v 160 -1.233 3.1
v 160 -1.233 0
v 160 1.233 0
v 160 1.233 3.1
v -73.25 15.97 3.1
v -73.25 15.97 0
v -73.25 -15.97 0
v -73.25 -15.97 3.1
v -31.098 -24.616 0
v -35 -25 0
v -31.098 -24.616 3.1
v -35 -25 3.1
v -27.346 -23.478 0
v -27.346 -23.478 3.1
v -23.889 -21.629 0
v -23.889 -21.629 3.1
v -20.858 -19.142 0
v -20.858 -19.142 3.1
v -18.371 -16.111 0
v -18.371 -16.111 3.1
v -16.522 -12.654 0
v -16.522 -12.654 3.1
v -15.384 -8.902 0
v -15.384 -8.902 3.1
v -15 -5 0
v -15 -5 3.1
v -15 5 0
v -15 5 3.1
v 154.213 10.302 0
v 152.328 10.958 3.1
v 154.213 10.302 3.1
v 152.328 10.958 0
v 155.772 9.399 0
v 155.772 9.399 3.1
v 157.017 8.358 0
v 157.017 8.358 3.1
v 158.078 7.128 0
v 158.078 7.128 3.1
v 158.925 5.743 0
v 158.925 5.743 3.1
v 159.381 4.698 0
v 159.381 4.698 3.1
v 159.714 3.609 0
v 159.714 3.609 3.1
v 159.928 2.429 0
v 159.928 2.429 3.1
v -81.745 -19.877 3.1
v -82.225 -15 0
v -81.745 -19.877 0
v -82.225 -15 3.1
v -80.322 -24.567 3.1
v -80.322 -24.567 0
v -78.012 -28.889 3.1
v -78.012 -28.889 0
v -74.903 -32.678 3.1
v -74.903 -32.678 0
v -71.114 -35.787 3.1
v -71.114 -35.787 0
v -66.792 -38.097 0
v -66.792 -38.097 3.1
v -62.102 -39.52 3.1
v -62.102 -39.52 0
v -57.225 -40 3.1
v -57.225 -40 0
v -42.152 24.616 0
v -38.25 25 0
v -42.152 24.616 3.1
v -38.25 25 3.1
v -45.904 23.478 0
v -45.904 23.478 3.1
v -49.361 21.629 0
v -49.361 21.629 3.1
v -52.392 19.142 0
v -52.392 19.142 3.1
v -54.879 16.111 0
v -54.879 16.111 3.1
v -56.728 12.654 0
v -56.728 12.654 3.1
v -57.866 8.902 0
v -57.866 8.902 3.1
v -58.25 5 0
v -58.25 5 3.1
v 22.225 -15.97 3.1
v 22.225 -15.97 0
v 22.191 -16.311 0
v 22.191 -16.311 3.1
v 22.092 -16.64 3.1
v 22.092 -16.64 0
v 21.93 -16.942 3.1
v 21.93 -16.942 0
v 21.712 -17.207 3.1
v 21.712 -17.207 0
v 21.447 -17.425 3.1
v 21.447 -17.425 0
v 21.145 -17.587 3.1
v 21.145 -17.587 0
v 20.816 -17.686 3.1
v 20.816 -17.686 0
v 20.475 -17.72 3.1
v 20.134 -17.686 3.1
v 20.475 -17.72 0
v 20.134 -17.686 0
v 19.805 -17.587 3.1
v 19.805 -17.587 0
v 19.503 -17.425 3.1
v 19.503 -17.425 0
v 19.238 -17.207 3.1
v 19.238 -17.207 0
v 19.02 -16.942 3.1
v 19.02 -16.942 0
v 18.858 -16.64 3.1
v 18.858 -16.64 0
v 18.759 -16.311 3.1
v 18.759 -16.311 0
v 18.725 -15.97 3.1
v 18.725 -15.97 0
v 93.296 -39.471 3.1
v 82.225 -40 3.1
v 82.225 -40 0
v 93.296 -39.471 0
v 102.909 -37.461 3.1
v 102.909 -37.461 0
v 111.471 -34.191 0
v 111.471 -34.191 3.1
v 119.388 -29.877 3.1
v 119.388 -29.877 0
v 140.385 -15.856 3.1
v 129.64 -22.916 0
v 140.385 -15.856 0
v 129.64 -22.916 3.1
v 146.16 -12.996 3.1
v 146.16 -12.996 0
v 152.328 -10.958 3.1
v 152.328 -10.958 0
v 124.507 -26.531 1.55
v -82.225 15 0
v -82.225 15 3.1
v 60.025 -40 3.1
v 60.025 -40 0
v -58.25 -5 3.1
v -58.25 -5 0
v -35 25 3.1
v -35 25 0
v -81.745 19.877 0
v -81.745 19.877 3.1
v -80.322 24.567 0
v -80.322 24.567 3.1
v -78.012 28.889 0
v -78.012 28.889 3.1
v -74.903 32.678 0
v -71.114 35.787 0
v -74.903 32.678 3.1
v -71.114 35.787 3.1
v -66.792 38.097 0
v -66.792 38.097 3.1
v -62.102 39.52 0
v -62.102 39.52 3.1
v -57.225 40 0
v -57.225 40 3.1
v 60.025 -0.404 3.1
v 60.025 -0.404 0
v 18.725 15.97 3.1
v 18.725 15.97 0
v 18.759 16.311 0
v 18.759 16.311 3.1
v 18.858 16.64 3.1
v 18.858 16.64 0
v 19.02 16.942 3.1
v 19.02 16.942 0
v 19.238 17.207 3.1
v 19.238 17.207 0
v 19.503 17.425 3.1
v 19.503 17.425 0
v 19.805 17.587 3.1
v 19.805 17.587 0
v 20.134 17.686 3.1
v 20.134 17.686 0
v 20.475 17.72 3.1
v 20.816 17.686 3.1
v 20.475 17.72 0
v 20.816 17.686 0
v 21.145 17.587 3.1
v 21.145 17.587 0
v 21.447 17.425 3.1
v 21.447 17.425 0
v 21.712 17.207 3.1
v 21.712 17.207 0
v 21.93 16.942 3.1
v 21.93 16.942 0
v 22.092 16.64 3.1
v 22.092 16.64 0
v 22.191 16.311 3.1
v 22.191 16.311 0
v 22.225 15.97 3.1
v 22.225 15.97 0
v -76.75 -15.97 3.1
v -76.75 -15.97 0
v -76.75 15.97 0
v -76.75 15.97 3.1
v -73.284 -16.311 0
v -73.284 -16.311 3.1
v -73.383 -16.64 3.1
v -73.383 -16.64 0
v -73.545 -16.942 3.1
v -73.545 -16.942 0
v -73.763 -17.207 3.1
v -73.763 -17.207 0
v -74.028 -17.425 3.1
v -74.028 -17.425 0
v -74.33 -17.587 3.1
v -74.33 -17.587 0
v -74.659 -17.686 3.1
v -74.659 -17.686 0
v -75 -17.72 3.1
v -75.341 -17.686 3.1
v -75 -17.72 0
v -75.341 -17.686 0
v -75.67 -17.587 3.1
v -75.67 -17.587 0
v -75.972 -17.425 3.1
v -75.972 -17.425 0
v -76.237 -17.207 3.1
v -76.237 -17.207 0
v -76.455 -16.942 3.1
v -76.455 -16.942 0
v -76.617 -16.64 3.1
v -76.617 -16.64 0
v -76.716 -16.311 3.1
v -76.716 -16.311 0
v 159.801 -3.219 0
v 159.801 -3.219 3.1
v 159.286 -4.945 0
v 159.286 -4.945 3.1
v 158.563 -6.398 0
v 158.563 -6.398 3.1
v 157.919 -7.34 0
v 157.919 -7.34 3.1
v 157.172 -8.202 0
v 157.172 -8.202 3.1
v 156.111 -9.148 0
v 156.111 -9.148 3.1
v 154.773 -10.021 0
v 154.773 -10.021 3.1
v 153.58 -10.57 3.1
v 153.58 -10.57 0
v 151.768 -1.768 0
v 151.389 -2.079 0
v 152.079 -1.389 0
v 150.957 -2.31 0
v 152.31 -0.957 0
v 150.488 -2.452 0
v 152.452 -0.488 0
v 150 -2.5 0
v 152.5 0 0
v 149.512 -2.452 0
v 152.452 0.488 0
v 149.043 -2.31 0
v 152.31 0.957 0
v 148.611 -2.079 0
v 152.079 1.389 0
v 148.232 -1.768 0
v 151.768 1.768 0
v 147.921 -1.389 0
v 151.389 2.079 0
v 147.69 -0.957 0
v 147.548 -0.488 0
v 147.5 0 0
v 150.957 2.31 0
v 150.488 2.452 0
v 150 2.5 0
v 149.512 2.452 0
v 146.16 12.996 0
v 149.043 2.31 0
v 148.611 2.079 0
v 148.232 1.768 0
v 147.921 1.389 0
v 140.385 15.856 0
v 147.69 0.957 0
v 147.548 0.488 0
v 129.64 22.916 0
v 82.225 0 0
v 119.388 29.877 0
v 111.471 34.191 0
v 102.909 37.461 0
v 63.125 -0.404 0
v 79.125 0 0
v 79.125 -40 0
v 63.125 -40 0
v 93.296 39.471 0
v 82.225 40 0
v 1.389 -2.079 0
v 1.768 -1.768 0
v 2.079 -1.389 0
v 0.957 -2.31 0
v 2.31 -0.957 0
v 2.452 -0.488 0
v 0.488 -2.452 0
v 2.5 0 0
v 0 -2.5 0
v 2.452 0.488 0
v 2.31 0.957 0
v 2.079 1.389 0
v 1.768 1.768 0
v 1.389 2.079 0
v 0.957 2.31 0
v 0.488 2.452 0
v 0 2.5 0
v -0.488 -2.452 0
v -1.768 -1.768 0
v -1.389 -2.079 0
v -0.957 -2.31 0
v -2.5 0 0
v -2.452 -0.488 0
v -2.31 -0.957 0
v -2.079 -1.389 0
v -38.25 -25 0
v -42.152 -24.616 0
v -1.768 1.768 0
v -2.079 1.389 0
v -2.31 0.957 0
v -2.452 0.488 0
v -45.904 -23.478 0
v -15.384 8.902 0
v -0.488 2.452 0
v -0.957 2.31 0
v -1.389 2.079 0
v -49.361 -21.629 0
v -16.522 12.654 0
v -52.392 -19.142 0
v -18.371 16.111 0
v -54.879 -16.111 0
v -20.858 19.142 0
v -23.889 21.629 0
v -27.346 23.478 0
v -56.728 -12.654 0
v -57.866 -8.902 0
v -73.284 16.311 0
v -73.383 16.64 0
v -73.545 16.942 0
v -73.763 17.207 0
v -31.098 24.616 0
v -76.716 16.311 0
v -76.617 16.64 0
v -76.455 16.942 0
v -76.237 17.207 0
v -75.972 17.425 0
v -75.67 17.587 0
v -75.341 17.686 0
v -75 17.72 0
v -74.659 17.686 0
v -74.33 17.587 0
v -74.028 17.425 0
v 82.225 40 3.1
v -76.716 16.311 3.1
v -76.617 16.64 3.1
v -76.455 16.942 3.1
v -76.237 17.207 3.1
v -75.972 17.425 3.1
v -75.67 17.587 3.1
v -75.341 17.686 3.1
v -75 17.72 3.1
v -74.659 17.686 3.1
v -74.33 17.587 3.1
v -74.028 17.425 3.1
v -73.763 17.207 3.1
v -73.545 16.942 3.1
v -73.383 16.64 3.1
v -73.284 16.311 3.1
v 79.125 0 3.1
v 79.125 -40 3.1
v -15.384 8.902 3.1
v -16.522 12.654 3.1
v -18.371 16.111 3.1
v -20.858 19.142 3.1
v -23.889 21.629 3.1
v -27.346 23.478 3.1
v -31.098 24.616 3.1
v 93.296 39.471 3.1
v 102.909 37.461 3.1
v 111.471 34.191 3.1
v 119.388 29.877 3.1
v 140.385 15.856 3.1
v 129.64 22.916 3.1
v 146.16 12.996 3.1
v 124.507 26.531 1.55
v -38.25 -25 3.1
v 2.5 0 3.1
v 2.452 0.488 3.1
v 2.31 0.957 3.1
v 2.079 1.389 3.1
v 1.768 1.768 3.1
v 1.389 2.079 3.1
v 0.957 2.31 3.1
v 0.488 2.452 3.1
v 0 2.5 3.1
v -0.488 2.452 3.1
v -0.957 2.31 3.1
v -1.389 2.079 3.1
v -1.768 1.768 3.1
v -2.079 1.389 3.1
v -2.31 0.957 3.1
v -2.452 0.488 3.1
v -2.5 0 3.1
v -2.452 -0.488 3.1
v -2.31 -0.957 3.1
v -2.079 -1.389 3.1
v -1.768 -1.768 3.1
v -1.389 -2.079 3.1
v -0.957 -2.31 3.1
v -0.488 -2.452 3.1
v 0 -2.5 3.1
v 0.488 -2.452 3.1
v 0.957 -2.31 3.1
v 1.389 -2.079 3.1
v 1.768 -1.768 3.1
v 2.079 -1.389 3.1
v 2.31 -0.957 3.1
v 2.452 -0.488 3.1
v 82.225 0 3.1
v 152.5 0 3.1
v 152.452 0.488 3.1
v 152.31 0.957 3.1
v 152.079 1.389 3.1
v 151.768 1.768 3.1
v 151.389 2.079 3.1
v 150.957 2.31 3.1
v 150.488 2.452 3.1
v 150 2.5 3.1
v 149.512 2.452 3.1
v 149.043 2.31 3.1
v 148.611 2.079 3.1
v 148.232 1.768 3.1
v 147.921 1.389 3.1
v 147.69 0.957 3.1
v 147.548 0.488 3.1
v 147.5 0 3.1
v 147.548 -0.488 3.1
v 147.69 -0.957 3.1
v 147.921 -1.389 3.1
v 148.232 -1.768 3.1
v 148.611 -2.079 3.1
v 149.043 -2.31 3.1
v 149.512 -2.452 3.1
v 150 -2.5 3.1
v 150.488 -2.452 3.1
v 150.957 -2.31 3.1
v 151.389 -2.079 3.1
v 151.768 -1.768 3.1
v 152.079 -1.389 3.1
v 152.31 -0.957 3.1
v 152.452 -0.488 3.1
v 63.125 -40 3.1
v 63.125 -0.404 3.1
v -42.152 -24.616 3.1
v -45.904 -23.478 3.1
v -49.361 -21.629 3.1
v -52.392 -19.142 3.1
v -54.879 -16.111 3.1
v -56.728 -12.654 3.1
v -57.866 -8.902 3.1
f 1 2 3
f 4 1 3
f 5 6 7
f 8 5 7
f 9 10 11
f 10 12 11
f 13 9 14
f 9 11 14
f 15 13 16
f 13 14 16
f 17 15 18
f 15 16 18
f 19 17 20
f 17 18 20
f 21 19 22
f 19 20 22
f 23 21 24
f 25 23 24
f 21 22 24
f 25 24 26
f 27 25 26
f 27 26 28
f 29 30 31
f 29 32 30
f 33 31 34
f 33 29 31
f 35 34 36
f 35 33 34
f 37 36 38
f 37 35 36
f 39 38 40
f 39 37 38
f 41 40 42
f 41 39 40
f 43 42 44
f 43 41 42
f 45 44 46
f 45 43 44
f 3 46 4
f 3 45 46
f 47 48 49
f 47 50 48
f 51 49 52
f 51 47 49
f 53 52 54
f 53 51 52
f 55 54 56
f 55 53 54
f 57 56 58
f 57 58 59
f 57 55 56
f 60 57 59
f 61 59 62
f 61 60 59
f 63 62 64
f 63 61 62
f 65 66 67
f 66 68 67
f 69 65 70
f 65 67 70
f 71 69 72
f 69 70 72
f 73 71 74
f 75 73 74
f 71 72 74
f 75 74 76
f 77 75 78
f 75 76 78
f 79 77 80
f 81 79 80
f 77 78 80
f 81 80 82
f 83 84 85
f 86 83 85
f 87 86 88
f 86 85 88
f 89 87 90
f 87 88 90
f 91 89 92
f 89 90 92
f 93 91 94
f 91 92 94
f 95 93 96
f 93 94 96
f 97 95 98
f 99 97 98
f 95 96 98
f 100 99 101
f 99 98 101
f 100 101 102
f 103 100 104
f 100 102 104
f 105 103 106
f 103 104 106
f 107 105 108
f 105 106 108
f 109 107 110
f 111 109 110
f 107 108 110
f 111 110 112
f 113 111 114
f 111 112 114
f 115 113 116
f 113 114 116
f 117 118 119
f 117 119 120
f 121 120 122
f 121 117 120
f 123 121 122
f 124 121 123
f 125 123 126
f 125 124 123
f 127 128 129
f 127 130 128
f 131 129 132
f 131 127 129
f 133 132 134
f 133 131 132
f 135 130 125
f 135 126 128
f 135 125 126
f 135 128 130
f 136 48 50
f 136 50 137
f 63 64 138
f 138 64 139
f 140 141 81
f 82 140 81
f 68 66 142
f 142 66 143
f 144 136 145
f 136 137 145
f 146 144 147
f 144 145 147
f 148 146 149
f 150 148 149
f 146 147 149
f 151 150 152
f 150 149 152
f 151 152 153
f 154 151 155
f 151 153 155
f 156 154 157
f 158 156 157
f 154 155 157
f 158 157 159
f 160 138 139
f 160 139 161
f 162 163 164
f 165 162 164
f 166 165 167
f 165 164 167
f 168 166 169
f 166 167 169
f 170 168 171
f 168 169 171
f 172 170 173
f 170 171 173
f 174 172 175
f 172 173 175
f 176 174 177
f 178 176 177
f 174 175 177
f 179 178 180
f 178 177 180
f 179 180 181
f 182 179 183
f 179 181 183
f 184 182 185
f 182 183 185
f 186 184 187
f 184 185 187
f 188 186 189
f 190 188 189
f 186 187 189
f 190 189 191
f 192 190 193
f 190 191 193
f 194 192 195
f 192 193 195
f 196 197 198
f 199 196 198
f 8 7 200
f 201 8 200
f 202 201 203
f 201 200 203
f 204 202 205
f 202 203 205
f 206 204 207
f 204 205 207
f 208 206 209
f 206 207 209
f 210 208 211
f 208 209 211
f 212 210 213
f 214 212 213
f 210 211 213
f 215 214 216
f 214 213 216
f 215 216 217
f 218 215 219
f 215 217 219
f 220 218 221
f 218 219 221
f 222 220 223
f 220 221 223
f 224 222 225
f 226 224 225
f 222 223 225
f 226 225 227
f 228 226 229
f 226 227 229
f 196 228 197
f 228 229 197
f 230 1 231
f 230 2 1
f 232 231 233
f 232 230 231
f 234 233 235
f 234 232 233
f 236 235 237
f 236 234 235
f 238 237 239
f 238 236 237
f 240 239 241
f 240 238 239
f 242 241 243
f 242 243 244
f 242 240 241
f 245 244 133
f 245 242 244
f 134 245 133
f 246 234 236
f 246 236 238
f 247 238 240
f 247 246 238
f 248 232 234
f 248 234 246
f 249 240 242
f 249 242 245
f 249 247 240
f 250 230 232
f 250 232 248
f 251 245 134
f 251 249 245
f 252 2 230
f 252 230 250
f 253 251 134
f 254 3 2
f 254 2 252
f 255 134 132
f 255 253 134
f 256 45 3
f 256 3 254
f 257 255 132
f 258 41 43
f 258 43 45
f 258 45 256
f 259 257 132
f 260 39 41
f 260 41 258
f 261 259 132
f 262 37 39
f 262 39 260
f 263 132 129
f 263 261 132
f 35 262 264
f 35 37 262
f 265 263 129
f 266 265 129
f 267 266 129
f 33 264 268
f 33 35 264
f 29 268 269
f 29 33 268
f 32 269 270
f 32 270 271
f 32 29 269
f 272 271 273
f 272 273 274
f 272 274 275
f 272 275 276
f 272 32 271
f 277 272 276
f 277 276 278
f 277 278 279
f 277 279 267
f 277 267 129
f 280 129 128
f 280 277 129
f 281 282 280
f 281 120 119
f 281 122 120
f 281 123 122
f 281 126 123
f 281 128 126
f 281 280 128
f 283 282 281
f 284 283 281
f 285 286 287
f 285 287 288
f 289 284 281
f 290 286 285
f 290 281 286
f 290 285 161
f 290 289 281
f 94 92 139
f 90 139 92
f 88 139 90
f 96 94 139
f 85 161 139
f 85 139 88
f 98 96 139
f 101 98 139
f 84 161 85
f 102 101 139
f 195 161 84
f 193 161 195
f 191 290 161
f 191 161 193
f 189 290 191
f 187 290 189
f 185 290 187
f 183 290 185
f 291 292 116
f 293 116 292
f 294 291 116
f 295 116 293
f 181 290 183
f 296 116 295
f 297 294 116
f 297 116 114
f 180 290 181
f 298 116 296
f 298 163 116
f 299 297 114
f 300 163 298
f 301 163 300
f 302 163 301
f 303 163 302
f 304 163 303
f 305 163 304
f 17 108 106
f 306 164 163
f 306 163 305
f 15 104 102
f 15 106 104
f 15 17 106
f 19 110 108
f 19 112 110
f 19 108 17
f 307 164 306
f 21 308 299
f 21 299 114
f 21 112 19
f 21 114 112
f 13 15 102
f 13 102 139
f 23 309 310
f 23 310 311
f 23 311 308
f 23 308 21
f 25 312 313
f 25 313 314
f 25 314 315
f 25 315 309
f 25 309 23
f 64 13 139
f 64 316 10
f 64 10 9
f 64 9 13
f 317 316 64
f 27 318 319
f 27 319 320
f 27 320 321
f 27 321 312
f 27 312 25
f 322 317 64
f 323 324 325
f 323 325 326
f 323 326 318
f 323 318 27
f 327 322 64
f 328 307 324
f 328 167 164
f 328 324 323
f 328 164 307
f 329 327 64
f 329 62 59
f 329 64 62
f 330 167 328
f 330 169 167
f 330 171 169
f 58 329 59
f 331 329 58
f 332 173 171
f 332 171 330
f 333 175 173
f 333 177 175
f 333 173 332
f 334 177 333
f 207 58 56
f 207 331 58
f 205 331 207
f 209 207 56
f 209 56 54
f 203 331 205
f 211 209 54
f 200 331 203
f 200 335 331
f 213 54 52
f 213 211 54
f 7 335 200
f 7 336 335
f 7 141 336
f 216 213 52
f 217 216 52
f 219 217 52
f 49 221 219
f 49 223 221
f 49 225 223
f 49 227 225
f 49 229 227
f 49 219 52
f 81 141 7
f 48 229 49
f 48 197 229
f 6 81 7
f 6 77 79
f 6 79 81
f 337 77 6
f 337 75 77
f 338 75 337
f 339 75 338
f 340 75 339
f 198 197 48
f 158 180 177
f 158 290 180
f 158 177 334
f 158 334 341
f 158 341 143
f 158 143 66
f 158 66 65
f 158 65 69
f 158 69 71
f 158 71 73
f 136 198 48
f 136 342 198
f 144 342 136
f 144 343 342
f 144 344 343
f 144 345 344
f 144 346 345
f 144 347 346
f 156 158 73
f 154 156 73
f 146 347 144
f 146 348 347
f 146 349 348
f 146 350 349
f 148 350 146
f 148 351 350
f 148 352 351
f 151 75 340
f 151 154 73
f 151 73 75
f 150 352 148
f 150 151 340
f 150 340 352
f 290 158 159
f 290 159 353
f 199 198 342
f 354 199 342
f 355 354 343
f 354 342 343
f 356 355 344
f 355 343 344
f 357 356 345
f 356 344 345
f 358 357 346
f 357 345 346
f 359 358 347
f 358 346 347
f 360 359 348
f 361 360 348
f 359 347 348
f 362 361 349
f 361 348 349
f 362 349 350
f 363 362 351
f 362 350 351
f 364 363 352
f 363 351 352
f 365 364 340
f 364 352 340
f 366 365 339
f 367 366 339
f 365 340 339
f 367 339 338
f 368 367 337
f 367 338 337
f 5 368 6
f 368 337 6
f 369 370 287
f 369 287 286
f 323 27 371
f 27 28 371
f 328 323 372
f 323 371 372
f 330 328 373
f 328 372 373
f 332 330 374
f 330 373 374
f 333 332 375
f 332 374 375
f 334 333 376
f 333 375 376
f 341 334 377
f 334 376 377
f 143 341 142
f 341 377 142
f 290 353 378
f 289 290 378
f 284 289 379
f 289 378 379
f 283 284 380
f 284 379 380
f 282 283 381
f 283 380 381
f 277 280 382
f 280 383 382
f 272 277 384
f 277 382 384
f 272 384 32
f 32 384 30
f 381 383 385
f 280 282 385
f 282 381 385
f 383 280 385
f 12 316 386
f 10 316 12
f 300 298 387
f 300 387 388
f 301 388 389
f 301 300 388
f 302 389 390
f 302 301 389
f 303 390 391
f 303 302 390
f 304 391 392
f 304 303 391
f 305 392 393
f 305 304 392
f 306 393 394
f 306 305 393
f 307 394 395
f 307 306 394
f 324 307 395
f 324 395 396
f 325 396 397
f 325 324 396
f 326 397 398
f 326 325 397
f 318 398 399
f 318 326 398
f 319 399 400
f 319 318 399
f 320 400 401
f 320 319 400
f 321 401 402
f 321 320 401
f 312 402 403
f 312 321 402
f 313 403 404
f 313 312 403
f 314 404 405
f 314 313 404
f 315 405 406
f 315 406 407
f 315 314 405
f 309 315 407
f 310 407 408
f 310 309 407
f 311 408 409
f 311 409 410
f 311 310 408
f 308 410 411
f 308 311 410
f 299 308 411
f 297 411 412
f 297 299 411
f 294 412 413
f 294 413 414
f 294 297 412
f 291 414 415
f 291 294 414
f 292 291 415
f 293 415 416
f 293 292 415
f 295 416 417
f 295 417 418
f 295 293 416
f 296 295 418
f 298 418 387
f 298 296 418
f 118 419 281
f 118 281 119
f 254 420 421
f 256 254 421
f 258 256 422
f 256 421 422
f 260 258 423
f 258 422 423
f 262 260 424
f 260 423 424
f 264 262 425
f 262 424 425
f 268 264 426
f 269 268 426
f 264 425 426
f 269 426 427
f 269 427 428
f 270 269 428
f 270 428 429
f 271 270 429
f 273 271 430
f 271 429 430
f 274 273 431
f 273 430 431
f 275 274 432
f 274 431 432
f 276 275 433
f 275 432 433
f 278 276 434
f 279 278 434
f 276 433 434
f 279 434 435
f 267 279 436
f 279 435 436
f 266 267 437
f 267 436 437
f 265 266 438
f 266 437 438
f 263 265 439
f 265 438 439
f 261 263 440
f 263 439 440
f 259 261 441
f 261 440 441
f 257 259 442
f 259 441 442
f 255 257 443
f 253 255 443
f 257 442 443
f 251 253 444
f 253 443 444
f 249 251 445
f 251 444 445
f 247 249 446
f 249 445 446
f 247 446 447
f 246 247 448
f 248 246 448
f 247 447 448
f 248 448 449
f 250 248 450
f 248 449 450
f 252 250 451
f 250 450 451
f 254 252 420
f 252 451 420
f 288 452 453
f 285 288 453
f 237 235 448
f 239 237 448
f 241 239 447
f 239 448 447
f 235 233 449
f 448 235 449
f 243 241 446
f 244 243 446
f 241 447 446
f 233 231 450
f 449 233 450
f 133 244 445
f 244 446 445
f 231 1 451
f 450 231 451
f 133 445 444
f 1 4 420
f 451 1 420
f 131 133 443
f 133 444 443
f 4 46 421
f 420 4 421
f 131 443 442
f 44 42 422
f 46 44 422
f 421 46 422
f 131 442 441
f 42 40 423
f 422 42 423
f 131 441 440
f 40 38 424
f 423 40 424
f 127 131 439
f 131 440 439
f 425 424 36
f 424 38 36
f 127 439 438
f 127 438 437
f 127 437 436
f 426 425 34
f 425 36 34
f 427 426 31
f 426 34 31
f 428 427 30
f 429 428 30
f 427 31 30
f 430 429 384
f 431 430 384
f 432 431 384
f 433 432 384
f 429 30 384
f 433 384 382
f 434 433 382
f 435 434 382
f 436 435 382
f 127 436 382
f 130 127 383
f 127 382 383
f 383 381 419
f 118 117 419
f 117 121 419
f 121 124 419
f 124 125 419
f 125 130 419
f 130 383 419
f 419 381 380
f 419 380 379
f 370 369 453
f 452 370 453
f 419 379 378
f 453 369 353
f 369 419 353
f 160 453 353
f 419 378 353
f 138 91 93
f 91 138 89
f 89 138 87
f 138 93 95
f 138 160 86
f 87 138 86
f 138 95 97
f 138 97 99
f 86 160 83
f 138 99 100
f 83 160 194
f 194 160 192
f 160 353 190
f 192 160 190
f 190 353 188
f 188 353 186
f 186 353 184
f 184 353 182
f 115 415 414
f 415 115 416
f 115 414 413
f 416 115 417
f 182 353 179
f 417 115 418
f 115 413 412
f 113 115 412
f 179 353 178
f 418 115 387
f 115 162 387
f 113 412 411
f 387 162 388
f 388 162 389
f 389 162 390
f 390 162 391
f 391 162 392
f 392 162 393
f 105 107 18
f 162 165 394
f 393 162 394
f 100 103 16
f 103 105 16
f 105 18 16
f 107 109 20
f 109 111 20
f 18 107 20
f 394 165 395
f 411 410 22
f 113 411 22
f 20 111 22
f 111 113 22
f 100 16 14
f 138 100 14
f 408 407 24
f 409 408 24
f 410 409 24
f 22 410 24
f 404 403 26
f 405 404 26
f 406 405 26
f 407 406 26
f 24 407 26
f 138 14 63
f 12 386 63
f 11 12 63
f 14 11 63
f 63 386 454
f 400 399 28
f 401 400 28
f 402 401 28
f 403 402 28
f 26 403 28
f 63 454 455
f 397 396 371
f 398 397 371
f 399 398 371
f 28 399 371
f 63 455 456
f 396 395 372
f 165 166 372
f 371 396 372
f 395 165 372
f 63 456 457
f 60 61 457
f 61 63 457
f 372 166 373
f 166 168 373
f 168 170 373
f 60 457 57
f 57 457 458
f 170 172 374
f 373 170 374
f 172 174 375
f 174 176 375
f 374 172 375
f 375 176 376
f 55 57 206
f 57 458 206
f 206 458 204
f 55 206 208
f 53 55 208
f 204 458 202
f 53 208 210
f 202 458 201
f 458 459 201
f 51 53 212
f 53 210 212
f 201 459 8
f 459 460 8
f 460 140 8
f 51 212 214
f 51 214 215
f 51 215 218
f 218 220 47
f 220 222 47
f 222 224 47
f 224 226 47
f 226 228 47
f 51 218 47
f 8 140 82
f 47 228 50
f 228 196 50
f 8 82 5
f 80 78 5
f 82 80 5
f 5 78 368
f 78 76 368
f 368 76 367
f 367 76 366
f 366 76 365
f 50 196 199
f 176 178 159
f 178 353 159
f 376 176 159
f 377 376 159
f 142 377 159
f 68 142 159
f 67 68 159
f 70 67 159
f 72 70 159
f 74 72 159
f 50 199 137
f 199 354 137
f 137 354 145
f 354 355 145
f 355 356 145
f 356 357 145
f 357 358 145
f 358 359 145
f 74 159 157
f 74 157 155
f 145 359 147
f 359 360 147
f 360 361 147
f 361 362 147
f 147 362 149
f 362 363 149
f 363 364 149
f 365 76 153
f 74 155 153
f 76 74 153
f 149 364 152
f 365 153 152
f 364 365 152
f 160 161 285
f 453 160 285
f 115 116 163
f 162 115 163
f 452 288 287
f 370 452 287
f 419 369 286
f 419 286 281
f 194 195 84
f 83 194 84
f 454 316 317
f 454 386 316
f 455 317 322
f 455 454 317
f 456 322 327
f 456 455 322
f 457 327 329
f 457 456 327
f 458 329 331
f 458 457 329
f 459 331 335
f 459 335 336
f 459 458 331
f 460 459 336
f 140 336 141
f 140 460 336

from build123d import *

# Parameters (mm, degrees)
SKETCH1_W           = 164.45
SKETCH1_H           = 80
SKETCH1_R           = 2.5
SKETCH1_W_2         = 43.25
SKETCH1_H_2         = 50
BOSS_EXTRUDE1_DEPTH = 3.1
SKETCH2_W           = 3.1
SKETCH2_H           = 39.596362368
SKETCH2_H_2         = 40
CUT_EXTRUDE1_DEPTH  = 4.1
FILLET1_R           = 25
SKETCH3_R           = 2.5
BOSS_EXTRUDE2_DEPTH = 3.1
FILLET3_R           = 10
FILLET4_R           = 20


with BuildPart() as part:
    # Sketch1 → Boss-Extrude1 (new body)
    with BuildSketch(Plane.XY):
        Rectangle(SKETCH1_W, SKETCH1_H)
        Circle(SKETCH1_R, mode=Mode.SUBTRACT)
        with BuildLine():
            Line((-76.75, -15.97), (-76.75, 15.97))
            ThreePointArc((-76.75, 15.97), (-75, 17.72), (-73.25, 15.97))
            Line((-73.25, 15.97), (-73.25, -15.97))
            ThreePointArc((-73.25, -15.97), (-75, -17.72), (-76.75, -15.97))
        make_face(mode=Mode.SUBTRACT)
        with BuildLine():
            Line((18.725, -15.97), (18.725, 15.97))
            ThreePointArc((18.725, 15.97), (20.475, 17.72), (22.225, 15.97))
            Line((22.225, 15.97), (22.225, -15.97))
            ThreePointArc((22.225, -15.97), (20.475, -17.72), (18.725, -15.97))
        make_face(mode=Mode.SUBTRACT)
        with Locations((-36.625, 0)):
            Rectangle(SKETCH1_W_2, SKETCH1_H_2, mode=Mode.SUBTRACT)
    extrude(amount=BOSS_EXTRUDE1_DEPTH)

    # Sketch2 → Cut-Extrude1 (cut, through all)
    with BuildSketch(Plane.XY.offset(3.1)):
        with Locations((61.575, -20.201818816)):
            Rectangle(SKETCH2_W, SKETCH2_H)
        with Locations((80.675, -20)):
            Rectangle(SKETCH2_W, SKETCH2_H_2)
    extrude(amount=-CUT_EXTRUDE1_DEPTH, mode=Mode.SUBTRACT)

    # Fillet1
    fillet1_edges = [part.edges().sort_by_distance(p)[0] for p in [
        (-82.225, -40, 1.55),
        (-82.225, 40, 1.55),
    ]]
    fillet(fillet1_edges, radius=FILLET1_R)

    # Sketch3 → Boss-Extrude2 (add)
    with BuildSketch(Plane.XY.offset(3.1)):
        with BuildLine():
            add(Edge.make_bspline(
                [(82.225, 40), (100.790922155, 40.44036534), (122.998075296, 29.670027282), (145.632337886, 10.163727788), (160, 10)],
                knots=[0, 0, 0, 0, 0.531248583, 1, 1, 1, 1], degree=3))
            Line((82.225, 40), (82.225, -40))
            add(Edge.make_bspline(
                [(82.225, -40), (100.790922155, -40.44036534), (122.998075296, -29.670027282), (145.632337886, -10.163727788), (160, -10)],
                knots=[0, 0, 0, 0, 0.531248583, 1, 1, 1, 1], degree=3))
            Line((160, -10), (160, 10))
        make_face()
        with Locations((150, 0)):
            Circle(SKETCH3_R, mode=Mode.SUBTRACT)
    extrude(amount=-BOSS_EXTRUDE2_DEPTH)

    # Fillet3
    fillet3_edges = [part.edges().sort_by_distance(p)[0] for p in [
        (160, -10, 1.55),
        (160, 10, 1.55),
    ]]
    fillet(fillet3_edges, radius=FILLET3_R)

    # Fillet4
    fillet4_edges = [part.edges().sort_by_distance(p)[0] for p in [
        (-15, -25, 1.55),
        (-15, 25, 1.55),
        (-58.25, 25, 1.55),
        (-58.25, -25, 1.55),
    ]]
    fillet(fillet4_edges, radius=FILLET4_R)


solid = part.part
